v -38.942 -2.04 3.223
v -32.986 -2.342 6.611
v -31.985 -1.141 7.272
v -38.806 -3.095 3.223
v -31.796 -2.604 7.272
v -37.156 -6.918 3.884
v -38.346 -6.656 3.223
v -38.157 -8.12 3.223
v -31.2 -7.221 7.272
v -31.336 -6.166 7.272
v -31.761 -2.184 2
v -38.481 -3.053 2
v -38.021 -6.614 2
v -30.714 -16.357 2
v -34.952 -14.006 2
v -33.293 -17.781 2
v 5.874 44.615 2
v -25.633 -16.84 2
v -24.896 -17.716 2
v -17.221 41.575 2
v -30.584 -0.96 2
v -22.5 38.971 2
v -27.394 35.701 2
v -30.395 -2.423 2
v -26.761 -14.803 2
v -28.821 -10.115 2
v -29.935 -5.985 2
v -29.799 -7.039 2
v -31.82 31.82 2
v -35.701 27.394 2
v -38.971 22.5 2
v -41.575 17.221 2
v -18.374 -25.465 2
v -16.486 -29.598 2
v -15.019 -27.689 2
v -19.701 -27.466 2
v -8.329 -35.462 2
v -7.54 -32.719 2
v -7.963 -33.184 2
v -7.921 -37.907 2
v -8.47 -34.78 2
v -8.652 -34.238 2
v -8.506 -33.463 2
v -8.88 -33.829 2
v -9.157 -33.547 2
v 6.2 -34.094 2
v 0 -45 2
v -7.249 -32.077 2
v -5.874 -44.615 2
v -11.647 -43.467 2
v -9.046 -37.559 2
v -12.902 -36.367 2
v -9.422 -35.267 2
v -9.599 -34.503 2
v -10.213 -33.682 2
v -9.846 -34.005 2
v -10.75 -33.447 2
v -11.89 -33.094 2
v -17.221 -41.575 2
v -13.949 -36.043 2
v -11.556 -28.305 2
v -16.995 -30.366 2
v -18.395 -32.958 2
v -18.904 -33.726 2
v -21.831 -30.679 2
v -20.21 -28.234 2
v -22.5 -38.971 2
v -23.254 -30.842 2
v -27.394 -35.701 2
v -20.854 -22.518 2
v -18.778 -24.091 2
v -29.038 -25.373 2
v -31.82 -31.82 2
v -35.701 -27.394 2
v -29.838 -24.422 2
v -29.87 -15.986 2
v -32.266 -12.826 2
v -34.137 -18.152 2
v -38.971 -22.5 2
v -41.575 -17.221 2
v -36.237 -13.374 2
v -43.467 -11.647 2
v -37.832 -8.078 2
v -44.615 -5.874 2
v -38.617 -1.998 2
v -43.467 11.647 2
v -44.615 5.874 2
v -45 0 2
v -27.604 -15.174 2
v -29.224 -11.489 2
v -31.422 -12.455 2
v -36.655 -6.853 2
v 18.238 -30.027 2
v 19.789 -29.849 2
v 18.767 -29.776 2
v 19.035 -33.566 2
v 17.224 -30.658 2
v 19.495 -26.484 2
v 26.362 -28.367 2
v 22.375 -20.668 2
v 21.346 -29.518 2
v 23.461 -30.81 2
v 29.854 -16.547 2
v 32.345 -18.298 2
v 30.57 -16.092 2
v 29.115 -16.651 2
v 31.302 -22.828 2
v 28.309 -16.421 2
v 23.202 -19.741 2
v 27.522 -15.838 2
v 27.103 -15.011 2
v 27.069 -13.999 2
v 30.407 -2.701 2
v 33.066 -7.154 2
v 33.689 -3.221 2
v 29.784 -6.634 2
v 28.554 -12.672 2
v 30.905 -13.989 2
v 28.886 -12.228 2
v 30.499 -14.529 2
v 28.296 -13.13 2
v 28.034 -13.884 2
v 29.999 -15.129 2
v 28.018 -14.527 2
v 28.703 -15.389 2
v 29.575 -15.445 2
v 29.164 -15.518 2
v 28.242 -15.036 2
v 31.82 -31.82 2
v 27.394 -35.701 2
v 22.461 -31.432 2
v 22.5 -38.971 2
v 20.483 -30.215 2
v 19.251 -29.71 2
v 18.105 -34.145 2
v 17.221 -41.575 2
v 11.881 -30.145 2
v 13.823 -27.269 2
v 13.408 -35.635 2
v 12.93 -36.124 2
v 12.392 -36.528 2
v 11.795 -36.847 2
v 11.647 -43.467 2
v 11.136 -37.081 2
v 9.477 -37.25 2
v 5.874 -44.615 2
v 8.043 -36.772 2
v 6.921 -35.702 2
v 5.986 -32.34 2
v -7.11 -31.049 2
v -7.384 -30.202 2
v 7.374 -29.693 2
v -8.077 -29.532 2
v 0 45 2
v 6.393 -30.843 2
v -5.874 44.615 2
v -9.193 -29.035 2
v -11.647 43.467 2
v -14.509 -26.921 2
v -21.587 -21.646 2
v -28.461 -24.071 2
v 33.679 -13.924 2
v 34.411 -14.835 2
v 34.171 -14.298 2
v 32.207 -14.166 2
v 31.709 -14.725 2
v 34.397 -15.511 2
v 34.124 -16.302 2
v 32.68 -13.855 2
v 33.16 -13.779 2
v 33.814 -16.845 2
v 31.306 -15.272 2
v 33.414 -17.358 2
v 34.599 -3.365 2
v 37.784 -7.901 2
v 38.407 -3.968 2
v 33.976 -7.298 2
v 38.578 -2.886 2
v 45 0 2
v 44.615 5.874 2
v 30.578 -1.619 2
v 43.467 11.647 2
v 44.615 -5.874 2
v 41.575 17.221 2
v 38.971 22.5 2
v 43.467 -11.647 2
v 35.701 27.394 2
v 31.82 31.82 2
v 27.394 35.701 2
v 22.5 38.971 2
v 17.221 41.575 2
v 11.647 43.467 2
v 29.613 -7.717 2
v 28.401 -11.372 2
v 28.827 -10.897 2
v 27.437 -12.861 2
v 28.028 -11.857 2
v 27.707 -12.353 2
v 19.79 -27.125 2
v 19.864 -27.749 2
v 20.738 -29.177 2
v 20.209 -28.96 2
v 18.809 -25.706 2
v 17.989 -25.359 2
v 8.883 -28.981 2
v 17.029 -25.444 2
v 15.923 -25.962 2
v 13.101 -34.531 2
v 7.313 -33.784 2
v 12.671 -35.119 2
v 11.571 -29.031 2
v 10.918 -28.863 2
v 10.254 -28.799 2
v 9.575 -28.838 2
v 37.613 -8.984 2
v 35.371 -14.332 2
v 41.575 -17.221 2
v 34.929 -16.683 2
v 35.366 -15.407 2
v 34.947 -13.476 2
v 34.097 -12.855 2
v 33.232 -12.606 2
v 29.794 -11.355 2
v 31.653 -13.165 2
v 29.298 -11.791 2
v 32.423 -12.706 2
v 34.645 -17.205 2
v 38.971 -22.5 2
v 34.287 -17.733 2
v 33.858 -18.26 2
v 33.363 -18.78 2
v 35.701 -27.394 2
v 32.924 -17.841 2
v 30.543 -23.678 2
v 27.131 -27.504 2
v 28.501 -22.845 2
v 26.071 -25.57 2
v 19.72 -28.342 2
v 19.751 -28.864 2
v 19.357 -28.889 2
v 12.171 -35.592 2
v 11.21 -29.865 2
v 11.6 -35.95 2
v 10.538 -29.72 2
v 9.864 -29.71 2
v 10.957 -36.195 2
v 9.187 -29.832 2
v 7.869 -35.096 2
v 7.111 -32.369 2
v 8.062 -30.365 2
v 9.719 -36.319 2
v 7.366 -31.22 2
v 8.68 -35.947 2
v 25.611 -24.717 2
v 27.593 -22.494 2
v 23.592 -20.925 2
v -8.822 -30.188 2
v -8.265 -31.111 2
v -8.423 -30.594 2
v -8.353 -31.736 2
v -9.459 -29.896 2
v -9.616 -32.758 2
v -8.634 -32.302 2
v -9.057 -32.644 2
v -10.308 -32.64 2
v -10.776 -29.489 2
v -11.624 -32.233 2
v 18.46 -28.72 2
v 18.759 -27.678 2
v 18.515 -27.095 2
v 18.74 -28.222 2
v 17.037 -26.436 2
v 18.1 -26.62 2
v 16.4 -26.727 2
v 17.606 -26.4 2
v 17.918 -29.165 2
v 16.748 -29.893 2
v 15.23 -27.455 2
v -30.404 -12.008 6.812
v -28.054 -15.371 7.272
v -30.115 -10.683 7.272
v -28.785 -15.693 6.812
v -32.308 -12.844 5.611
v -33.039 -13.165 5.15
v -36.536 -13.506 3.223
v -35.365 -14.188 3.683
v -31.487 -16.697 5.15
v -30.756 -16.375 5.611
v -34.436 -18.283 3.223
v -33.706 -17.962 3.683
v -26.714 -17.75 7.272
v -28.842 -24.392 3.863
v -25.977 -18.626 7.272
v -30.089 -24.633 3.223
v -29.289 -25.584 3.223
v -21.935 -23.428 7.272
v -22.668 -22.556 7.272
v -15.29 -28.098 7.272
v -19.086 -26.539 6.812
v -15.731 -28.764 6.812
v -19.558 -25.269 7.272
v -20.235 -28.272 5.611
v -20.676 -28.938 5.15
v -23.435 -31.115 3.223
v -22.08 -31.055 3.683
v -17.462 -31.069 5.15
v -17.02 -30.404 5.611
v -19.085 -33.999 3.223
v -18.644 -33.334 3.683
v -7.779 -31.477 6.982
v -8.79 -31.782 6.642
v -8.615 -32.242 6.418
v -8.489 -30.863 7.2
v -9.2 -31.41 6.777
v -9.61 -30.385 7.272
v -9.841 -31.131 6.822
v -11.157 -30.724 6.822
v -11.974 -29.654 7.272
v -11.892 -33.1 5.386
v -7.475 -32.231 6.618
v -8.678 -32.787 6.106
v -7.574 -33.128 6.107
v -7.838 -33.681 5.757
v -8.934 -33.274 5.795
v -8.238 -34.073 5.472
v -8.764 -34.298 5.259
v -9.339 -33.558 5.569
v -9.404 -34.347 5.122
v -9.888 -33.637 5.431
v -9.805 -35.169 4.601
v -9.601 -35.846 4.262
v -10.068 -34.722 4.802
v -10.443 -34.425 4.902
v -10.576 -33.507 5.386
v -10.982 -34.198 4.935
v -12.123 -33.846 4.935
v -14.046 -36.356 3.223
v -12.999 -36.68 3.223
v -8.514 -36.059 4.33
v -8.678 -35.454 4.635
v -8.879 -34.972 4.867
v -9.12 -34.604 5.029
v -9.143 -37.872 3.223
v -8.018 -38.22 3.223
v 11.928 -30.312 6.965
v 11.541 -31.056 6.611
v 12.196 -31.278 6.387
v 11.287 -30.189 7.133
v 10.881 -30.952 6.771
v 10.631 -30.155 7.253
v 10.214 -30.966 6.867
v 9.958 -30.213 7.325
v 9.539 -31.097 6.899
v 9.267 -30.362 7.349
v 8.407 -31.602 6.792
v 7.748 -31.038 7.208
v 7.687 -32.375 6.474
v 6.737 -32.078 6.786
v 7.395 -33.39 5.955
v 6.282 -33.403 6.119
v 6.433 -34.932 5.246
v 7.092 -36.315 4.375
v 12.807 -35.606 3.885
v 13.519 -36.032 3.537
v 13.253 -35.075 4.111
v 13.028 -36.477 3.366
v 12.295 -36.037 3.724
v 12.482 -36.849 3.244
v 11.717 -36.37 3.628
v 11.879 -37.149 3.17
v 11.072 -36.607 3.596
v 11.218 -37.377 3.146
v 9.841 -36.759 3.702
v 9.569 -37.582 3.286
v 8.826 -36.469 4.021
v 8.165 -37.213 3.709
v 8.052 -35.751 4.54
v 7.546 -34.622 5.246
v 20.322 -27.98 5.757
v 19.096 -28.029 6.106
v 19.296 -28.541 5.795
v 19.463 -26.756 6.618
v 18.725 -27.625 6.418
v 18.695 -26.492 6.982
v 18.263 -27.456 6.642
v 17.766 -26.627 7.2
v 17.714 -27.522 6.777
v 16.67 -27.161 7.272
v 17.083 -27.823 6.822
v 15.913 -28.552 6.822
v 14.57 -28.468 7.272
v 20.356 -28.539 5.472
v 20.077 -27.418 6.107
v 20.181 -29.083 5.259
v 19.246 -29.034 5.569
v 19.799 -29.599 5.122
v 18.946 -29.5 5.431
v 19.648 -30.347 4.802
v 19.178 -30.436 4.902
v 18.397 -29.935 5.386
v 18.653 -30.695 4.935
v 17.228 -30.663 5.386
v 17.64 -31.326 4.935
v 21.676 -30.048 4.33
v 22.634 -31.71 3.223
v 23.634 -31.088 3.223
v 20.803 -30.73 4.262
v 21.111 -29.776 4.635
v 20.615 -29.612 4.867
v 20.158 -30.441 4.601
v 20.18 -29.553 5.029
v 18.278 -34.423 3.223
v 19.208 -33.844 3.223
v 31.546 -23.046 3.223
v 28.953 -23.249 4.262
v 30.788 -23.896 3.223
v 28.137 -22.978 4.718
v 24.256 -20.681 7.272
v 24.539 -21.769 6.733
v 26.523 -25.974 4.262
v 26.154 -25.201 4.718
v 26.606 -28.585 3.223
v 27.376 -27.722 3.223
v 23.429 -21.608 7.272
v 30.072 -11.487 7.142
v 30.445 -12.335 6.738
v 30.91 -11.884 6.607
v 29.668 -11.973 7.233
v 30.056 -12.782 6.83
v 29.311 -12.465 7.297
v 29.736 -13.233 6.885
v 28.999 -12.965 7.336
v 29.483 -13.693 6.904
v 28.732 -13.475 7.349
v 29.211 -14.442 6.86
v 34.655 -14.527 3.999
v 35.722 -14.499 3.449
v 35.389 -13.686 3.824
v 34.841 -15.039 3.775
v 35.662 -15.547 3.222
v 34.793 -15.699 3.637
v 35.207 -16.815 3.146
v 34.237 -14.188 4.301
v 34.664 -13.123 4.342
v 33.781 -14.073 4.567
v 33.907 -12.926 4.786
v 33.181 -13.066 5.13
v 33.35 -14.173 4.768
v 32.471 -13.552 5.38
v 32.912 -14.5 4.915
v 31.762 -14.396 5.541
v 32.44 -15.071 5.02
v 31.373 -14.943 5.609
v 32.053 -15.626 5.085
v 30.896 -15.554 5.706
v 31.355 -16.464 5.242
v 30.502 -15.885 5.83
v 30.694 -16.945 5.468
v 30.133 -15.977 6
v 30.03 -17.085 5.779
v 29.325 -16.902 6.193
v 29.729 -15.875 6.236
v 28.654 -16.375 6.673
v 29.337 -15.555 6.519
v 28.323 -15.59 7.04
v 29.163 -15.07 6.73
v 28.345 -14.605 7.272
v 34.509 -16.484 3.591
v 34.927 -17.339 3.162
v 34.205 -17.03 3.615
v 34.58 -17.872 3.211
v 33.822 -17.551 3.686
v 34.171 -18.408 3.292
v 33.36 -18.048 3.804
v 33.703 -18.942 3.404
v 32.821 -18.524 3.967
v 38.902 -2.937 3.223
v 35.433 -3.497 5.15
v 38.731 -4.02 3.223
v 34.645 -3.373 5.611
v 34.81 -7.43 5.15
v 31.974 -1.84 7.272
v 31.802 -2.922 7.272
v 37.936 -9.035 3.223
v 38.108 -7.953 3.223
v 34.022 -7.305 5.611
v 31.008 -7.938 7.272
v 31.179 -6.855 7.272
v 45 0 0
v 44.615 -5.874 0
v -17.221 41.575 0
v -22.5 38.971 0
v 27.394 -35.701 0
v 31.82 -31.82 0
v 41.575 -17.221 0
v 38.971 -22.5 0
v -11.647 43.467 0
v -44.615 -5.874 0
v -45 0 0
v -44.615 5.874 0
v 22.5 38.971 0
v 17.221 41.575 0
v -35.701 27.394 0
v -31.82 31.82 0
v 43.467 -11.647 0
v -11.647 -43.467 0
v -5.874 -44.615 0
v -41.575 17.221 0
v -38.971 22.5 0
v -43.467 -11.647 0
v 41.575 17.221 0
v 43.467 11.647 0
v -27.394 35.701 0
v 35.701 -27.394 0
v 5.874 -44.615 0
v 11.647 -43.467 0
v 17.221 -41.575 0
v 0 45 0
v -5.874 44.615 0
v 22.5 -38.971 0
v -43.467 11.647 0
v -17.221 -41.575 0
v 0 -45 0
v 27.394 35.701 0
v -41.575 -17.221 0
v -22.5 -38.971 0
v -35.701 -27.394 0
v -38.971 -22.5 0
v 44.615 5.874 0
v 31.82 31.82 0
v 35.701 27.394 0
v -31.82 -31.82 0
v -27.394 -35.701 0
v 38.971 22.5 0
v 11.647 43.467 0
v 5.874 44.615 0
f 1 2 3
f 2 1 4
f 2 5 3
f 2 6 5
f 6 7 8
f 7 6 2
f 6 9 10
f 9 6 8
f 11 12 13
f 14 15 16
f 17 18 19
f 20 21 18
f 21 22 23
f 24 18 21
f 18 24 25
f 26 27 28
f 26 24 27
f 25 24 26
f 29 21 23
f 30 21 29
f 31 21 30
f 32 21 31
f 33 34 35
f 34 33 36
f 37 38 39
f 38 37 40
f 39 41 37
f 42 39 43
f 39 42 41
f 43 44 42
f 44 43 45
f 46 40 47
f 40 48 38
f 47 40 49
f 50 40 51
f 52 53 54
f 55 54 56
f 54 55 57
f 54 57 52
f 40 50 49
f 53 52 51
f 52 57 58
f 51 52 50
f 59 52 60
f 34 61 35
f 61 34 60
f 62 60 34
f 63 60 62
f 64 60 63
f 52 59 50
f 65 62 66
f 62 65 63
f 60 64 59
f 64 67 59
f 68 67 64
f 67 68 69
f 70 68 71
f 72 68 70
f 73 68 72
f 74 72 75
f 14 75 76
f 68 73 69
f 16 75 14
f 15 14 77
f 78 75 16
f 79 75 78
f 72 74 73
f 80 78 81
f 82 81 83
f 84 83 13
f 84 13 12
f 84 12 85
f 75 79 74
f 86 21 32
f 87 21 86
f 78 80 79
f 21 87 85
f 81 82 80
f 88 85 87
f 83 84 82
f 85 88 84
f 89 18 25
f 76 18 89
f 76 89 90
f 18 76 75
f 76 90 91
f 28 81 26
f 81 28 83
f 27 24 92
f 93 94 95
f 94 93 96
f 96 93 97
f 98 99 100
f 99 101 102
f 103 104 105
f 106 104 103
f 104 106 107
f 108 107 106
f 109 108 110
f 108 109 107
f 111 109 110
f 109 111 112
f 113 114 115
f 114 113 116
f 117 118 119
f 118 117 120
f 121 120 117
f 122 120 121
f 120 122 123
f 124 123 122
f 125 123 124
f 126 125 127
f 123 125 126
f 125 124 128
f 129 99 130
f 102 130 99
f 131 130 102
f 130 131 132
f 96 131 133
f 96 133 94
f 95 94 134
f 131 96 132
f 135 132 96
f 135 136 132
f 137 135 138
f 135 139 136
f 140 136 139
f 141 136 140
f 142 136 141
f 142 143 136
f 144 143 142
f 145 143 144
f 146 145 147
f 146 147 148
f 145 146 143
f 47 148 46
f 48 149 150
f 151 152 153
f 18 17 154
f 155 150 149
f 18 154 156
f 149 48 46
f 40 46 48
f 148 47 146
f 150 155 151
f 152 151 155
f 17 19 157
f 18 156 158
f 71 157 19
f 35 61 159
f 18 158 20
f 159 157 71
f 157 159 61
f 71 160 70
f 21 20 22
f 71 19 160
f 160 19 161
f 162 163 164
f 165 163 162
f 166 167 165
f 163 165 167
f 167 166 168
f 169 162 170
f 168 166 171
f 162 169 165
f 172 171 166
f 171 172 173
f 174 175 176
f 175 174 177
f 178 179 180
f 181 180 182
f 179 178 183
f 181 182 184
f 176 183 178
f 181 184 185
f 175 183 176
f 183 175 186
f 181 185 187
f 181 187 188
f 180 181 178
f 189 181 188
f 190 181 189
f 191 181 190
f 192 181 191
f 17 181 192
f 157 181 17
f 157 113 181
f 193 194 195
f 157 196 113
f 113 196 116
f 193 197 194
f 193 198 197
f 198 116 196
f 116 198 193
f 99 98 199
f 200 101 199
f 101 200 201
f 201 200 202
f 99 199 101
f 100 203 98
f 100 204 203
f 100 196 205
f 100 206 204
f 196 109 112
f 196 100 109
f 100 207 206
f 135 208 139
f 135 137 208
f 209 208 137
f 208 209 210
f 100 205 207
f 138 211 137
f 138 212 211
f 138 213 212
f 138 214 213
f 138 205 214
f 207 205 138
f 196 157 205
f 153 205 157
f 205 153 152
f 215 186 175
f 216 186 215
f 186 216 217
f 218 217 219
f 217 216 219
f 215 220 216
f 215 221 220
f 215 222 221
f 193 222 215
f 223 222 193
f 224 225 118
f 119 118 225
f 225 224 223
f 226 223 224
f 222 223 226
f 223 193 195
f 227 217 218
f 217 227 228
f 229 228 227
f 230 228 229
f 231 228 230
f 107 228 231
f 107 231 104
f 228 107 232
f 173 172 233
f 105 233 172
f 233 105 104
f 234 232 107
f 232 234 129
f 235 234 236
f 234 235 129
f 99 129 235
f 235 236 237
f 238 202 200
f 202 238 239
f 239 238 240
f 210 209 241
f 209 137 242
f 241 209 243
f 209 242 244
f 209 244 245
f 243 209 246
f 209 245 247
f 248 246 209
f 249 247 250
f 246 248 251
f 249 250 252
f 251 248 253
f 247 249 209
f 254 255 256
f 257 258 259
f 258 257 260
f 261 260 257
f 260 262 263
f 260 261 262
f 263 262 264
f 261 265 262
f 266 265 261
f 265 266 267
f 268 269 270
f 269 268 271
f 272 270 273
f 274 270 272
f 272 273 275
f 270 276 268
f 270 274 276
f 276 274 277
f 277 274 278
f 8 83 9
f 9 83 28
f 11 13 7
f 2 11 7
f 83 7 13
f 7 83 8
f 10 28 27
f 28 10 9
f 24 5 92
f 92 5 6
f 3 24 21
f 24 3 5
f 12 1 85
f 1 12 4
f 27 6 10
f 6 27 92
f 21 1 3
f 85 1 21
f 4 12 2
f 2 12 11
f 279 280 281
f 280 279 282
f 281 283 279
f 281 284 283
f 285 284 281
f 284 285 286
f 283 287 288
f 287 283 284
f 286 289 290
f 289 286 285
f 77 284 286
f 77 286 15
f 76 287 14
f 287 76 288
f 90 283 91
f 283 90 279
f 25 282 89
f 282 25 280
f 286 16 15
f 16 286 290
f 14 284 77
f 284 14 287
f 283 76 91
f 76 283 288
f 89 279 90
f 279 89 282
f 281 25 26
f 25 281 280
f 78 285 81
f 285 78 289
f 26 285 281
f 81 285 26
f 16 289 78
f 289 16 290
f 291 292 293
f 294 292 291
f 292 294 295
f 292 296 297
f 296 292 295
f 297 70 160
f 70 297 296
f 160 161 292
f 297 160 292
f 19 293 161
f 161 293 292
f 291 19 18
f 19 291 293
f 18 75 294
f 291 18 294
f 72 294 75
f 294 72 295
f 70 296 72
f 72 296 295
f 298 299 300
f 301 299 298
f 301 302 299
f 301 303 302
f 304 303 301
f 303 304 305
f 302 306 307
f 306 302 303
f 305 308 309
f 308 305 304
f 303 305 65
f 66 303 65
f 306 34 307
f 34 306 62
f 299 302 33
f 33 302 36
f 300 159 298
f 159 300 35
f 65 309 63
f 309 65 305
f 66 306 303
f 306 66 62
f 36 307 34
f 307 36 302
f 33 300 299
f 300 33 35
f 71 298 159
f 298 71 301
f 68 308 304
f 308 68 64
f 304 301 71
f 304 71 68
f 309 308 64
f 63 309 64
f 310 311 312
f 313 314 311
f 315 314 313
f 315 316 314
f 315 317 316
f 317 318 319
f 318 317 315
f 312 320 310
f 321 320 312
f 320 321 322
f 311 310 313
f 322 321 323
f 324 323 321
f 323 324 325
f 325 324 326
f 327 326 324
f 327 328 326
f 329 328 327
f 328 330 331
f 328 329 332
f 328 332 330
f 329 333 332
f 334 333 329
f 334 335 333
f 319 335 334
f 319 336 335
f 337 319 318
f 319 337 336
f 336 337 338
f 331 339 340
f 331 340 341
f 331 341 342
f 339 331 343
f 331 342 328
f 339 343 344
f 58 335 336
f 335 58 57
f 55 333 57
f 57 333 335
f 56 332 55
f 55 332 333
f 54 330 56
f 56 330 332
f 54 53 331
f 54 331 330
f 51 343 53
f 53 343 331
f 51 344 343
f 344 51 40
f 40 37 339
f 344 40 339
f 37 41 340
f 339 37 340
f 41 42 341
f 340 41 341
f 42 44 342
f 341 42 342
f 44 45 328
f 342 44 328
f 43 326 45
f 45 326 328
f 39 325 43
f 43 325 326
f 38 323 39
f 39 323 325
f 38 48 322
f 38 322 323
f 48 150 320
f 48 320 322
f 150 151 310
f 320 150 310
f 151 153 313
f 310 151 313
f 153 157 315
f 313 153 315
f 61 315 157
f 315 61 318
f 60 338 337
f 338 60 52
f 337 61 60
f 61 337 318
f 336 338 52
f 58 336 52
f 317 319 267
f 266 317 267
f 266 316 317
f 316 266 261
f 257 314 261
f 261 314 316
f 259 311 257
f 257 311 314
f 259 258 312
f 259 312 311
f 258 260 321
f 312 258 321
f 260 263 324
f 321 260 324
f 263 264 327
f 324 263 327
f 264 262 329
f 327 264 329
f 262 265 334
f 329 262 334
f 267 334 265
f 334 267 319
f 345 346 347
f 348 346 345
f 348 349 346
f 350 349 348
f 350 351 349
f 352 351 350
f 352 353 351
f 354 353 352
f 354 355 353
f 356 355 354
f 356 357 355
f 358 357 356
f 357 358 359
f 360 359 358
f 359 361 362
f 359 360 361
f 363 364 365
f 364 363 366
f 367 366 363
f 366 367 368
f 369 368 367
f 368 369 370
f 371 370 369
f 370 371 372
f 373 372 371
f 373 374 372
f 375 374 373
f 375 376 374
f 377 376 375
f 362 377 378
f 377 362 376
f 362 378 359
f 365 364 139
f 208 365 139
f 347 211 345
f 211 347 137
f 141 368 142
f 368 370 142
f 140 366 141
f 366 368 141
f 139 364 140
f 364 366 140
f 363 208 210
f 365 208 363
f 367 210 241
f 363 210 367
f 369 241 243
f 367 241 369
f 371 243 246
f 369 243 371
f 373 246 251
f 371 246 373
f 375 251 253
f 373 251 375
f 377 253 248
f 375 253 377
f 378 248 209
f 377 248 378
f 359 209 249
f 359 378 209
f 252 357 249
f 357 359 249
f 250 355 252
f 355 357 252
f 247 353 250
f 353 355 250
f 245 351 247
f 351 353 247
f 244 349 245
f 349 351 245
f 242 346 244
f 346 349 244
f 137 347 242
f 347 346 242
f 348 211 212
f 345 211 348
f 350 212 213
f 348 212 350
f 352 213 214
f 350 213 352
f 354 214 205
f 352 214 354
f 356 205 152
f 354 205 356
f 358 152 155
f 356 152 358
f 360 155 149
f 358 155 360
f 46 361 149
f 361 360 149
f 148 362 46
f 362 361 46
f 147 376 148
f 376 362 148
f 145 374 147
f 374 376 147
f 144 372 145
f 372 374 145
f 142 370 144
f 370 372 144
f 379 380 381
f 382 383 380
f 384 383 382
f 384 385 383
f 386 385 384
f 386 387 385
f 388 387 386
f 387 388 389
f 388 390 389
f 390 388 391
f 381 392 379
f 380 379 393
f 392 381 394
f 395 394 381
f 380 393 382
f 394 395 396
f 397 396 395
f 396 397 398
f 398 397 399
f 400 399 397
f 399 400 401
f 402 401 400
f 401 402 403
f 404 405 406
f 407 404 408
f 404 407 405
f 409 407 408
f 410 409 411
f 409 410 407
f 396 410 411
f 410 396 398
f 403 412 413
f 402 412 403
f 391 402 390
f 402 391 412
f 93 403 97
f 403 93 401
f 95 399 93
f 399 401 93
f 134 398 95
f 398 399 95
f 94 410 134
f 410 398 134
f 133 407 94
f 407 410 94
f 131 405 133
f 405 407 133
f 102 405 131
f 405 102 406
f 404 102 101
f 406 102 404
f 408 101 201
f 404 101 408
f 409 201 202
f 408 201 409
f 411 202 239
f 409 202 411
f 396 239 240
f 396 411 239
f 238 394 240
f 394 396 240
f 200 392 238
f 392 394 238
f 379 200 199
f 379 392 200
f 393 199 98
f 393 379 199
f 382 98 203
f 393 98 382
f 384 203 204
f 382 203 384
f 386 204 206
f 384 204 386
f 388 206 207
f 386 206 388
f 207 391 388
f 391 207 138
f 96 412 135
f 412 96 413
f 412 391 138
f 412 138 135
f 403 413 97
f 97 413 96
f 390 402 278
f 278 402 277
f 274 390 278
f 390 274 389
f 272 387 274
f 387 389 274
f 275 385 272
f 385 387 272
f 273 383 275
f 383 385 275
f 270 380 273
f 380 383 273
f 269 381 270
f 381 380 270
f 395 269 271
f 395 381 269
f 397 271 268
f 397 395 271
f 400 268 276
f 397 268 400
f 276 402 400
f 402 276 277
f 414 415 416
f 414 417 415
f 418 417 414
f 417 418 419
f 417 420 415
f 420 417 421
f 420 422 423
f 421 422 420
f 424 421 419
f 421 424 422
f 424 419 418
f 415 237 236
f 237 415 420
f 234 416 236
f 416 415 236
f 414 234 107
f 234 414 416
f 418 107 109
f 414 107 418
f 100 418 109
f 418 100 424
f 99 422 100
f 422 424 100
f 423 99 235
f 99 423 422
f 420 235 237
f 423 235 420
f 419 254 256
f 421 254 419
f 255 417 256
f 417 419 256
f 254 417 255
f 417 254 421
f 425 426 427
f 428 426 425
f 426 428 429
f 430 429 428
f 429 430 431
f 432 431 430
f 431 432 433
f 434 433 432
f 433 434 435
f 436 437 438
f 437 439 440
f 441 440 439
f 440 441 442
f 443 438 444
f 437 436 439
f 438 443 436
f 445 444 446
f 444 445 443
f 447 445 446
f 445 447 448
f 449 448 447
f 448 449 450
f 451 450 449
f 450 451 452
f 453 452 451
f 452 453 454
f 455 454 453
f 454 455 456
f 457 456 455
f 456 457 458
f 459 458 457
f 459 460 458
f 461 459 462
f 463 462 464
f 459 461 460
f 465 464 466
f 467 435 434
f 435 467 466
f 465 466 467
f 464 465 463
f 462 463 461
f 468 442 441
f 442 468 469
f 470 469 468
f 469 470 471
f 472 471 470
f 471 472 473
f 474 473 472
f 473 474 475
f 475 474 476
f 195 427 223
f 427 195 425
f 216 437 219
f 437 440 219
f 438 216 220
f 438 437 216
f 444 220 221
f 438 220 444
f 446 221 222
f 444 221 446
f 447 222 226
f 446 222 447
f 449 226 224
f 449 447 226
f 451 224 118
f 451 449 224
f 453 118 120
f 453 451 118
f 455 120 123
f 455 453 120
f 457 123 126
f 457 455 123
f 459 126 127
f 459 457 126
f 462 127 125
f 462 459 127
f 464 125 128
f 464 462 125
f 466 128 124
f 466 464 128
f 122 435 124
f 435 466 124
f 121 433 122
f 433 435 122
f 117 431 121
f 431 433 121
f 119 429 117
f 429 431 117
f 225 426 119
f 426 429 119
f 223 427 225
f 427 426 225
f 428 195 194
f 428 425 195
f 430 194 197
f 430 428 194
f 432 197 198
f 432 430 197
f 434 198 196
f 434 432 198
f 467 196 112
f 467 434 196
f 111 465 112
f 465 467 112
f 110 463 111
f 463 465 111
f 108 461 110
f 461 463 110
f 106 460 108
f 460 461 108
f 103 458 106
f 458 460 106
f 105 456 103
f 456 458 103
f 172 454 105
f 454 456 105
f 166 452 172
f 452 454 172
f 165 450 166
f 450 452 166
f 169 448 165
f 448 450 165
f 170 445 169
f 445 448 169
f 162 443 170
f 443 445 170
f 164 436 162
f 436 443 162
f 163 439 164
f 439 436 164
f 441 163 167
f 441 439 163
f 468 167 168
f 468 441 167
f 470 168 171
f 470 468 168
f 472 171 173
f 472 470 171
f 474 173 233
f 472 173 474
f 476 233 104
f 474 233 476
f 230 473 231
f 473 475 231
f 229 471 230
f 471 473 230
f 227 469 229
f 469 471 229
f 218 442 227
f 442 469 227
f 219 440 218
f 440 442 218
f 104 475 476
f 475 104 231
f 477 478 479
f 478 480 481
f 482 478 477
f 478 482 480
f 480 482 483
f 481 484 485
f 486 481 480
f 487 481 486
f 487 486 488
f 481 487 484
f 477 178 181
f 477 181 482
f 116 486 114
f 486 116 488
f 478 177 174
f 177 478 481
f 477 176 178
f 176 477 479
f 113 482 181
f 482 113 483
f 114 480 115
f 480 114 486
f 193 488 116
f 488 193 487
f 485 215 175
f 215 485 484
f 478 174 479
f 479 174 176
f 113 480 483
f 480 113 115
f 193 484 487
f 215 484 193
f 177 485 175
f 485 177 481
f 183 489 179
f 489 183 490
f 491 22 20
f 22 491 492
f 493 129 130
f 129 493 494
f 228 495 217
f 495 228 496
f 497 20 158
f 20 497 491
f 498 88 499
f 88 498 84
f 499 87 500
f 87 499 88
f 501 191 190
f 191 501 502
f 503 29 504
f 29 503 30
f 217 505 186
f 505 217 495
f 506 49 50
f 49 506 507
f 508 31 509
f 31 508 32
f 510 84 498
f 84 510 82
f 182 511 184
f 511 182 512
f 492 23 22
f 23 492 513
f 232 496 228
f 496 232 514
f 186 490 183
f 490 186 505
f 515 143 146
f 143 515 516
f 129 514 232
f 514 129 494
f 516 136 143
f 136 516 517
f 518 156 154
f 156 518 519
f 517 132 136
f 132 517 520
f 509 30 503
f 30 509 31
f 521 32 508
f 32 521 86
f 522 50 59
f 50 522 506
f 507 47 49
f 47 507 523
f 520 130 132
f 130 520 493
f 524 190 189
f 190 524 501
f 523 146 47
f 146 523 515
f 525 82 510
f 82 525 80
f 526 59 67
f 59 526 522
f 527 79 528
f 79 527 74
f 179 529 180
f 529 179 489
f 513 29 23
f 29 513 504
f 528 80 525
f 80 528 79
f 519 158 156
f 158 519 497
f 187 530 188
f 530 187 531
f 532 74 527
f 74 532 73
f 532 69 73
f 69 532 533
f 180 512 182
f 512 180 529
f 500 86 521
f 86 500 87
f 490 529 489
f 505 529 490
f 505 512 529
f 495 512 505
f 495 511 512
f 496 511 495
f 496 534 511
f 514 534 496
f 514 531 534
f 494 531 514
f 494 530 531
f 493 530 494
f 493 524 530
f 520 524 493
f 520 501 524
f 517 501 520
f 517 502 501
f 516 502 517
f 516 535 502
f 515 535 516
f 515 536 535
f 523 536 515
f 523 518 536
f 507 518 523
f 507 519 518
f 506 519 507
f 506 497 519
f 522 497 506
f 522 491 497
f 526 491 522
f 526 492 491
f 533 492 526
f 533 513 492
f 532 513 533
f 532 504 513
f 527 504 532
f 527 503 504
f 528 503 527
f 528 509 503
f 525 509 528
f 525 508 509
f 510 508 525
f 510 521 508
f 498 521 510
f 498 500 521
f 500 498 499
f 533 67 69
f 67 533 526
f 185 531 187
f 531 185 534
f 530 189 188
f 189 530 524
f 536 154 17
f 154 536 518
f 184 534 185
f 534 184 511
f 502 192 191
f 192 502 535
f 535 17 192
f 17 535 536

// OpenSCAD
radius = 45; // [45:450]
bottom_thickness = 2;

text = "NEVER CRASH";
font_name = "Arial Black";
font_size = 8;

/**
* pie.scad
*
* Creates a pie (circular sector). You can pass a 2 element vector to define the central angle. Its $fa, $fs and $fn parameters are consistent with the circle module.
* 
* @copyright Justin Lin, 2017
* @license https://opensource.org/licenses/lgpl-3.0.html
*
* @see https://openhome.cc/eGossip/OpenSCAD/lib-pie.html
*
**/

function __frags(radius) = $fn > 0 ? 
            ($fn >= 3 ? $fn : 3) : 
            max(min(360 / $fa, radius * 6.28318 / $fs), 5);
                
function __is_vector(value) = !(value >= "") && len(value) != undef;

function __ra_to_xy(r, a) = [r * cos(a), r * sin(a)];

function __shape_pie(radius, angle) =
    let(
        frags = __frags(radius),
        a_step = 360 / frags,
        leng = radius * cos(a_step / 2),
        angles = __is_vector(angle) ? angle : [0:angle],
        m = floor(angles[0] / a_step) + 1,
        n = floor(angles[1] / a_step),
        edge_r_begin = leng / cos((m - 0.5) * a_step - angles[0]),
        edge_r_end = leng / cos((n + 0.5) * a_step - angles[1]),
        shape_pts = concat(
            [[0, 0], __ra_to_xy(edge_r_begin, angles[0])],
            m > n ? [] : [
                for(i = [m:n]) 
                    let(a = a_step * i) 
                    __ra_to_xy(radius, a)
            ],
            angles[1] == a_step * n ? [] : [__ra_to_xy(edge_r_end, angles[1])]
        )
    ) shape_pts;
 
module pie(radius, angle) {
    polygon(__shape_pie(radius, angle));
}

module char(c, font_name, font_size) {
    rotate(90) 
        rotate([-90, 0, 0]) 
            intersection() {
                linear_extrude(font_size * 2, center = true) 
                    pie(radius = font_size * 2, angle = [-30, 0]);  
                    
                rotate_extrude() 
                    translate([font_size / 1.25, 0, 0]) rotate(-90) 
                        text(c, font = font_name, size = font_size, valign = "center", halign = "center"); 
            }
}

module Buddha_Duke() {
    t_len = len(text);
    a_step = 180 / t_len;
    
    for(i = [0:t_len - 1]) {
        translate([0, 0, bottom_thickness]) 
            rotate(-90 + a_step * i + 0.45 * a_step)
                translate([0, -radius + font_size / 2, 0]) 
                    char(text[i], font_name, font_size, $fn = 12);
    }

    linear_extrude(bottom_thickness) 
        circle(radius, $fn = 48); 
}

Buddha_Duke(text, font_name, font_size, radius, bottom_thickness);
